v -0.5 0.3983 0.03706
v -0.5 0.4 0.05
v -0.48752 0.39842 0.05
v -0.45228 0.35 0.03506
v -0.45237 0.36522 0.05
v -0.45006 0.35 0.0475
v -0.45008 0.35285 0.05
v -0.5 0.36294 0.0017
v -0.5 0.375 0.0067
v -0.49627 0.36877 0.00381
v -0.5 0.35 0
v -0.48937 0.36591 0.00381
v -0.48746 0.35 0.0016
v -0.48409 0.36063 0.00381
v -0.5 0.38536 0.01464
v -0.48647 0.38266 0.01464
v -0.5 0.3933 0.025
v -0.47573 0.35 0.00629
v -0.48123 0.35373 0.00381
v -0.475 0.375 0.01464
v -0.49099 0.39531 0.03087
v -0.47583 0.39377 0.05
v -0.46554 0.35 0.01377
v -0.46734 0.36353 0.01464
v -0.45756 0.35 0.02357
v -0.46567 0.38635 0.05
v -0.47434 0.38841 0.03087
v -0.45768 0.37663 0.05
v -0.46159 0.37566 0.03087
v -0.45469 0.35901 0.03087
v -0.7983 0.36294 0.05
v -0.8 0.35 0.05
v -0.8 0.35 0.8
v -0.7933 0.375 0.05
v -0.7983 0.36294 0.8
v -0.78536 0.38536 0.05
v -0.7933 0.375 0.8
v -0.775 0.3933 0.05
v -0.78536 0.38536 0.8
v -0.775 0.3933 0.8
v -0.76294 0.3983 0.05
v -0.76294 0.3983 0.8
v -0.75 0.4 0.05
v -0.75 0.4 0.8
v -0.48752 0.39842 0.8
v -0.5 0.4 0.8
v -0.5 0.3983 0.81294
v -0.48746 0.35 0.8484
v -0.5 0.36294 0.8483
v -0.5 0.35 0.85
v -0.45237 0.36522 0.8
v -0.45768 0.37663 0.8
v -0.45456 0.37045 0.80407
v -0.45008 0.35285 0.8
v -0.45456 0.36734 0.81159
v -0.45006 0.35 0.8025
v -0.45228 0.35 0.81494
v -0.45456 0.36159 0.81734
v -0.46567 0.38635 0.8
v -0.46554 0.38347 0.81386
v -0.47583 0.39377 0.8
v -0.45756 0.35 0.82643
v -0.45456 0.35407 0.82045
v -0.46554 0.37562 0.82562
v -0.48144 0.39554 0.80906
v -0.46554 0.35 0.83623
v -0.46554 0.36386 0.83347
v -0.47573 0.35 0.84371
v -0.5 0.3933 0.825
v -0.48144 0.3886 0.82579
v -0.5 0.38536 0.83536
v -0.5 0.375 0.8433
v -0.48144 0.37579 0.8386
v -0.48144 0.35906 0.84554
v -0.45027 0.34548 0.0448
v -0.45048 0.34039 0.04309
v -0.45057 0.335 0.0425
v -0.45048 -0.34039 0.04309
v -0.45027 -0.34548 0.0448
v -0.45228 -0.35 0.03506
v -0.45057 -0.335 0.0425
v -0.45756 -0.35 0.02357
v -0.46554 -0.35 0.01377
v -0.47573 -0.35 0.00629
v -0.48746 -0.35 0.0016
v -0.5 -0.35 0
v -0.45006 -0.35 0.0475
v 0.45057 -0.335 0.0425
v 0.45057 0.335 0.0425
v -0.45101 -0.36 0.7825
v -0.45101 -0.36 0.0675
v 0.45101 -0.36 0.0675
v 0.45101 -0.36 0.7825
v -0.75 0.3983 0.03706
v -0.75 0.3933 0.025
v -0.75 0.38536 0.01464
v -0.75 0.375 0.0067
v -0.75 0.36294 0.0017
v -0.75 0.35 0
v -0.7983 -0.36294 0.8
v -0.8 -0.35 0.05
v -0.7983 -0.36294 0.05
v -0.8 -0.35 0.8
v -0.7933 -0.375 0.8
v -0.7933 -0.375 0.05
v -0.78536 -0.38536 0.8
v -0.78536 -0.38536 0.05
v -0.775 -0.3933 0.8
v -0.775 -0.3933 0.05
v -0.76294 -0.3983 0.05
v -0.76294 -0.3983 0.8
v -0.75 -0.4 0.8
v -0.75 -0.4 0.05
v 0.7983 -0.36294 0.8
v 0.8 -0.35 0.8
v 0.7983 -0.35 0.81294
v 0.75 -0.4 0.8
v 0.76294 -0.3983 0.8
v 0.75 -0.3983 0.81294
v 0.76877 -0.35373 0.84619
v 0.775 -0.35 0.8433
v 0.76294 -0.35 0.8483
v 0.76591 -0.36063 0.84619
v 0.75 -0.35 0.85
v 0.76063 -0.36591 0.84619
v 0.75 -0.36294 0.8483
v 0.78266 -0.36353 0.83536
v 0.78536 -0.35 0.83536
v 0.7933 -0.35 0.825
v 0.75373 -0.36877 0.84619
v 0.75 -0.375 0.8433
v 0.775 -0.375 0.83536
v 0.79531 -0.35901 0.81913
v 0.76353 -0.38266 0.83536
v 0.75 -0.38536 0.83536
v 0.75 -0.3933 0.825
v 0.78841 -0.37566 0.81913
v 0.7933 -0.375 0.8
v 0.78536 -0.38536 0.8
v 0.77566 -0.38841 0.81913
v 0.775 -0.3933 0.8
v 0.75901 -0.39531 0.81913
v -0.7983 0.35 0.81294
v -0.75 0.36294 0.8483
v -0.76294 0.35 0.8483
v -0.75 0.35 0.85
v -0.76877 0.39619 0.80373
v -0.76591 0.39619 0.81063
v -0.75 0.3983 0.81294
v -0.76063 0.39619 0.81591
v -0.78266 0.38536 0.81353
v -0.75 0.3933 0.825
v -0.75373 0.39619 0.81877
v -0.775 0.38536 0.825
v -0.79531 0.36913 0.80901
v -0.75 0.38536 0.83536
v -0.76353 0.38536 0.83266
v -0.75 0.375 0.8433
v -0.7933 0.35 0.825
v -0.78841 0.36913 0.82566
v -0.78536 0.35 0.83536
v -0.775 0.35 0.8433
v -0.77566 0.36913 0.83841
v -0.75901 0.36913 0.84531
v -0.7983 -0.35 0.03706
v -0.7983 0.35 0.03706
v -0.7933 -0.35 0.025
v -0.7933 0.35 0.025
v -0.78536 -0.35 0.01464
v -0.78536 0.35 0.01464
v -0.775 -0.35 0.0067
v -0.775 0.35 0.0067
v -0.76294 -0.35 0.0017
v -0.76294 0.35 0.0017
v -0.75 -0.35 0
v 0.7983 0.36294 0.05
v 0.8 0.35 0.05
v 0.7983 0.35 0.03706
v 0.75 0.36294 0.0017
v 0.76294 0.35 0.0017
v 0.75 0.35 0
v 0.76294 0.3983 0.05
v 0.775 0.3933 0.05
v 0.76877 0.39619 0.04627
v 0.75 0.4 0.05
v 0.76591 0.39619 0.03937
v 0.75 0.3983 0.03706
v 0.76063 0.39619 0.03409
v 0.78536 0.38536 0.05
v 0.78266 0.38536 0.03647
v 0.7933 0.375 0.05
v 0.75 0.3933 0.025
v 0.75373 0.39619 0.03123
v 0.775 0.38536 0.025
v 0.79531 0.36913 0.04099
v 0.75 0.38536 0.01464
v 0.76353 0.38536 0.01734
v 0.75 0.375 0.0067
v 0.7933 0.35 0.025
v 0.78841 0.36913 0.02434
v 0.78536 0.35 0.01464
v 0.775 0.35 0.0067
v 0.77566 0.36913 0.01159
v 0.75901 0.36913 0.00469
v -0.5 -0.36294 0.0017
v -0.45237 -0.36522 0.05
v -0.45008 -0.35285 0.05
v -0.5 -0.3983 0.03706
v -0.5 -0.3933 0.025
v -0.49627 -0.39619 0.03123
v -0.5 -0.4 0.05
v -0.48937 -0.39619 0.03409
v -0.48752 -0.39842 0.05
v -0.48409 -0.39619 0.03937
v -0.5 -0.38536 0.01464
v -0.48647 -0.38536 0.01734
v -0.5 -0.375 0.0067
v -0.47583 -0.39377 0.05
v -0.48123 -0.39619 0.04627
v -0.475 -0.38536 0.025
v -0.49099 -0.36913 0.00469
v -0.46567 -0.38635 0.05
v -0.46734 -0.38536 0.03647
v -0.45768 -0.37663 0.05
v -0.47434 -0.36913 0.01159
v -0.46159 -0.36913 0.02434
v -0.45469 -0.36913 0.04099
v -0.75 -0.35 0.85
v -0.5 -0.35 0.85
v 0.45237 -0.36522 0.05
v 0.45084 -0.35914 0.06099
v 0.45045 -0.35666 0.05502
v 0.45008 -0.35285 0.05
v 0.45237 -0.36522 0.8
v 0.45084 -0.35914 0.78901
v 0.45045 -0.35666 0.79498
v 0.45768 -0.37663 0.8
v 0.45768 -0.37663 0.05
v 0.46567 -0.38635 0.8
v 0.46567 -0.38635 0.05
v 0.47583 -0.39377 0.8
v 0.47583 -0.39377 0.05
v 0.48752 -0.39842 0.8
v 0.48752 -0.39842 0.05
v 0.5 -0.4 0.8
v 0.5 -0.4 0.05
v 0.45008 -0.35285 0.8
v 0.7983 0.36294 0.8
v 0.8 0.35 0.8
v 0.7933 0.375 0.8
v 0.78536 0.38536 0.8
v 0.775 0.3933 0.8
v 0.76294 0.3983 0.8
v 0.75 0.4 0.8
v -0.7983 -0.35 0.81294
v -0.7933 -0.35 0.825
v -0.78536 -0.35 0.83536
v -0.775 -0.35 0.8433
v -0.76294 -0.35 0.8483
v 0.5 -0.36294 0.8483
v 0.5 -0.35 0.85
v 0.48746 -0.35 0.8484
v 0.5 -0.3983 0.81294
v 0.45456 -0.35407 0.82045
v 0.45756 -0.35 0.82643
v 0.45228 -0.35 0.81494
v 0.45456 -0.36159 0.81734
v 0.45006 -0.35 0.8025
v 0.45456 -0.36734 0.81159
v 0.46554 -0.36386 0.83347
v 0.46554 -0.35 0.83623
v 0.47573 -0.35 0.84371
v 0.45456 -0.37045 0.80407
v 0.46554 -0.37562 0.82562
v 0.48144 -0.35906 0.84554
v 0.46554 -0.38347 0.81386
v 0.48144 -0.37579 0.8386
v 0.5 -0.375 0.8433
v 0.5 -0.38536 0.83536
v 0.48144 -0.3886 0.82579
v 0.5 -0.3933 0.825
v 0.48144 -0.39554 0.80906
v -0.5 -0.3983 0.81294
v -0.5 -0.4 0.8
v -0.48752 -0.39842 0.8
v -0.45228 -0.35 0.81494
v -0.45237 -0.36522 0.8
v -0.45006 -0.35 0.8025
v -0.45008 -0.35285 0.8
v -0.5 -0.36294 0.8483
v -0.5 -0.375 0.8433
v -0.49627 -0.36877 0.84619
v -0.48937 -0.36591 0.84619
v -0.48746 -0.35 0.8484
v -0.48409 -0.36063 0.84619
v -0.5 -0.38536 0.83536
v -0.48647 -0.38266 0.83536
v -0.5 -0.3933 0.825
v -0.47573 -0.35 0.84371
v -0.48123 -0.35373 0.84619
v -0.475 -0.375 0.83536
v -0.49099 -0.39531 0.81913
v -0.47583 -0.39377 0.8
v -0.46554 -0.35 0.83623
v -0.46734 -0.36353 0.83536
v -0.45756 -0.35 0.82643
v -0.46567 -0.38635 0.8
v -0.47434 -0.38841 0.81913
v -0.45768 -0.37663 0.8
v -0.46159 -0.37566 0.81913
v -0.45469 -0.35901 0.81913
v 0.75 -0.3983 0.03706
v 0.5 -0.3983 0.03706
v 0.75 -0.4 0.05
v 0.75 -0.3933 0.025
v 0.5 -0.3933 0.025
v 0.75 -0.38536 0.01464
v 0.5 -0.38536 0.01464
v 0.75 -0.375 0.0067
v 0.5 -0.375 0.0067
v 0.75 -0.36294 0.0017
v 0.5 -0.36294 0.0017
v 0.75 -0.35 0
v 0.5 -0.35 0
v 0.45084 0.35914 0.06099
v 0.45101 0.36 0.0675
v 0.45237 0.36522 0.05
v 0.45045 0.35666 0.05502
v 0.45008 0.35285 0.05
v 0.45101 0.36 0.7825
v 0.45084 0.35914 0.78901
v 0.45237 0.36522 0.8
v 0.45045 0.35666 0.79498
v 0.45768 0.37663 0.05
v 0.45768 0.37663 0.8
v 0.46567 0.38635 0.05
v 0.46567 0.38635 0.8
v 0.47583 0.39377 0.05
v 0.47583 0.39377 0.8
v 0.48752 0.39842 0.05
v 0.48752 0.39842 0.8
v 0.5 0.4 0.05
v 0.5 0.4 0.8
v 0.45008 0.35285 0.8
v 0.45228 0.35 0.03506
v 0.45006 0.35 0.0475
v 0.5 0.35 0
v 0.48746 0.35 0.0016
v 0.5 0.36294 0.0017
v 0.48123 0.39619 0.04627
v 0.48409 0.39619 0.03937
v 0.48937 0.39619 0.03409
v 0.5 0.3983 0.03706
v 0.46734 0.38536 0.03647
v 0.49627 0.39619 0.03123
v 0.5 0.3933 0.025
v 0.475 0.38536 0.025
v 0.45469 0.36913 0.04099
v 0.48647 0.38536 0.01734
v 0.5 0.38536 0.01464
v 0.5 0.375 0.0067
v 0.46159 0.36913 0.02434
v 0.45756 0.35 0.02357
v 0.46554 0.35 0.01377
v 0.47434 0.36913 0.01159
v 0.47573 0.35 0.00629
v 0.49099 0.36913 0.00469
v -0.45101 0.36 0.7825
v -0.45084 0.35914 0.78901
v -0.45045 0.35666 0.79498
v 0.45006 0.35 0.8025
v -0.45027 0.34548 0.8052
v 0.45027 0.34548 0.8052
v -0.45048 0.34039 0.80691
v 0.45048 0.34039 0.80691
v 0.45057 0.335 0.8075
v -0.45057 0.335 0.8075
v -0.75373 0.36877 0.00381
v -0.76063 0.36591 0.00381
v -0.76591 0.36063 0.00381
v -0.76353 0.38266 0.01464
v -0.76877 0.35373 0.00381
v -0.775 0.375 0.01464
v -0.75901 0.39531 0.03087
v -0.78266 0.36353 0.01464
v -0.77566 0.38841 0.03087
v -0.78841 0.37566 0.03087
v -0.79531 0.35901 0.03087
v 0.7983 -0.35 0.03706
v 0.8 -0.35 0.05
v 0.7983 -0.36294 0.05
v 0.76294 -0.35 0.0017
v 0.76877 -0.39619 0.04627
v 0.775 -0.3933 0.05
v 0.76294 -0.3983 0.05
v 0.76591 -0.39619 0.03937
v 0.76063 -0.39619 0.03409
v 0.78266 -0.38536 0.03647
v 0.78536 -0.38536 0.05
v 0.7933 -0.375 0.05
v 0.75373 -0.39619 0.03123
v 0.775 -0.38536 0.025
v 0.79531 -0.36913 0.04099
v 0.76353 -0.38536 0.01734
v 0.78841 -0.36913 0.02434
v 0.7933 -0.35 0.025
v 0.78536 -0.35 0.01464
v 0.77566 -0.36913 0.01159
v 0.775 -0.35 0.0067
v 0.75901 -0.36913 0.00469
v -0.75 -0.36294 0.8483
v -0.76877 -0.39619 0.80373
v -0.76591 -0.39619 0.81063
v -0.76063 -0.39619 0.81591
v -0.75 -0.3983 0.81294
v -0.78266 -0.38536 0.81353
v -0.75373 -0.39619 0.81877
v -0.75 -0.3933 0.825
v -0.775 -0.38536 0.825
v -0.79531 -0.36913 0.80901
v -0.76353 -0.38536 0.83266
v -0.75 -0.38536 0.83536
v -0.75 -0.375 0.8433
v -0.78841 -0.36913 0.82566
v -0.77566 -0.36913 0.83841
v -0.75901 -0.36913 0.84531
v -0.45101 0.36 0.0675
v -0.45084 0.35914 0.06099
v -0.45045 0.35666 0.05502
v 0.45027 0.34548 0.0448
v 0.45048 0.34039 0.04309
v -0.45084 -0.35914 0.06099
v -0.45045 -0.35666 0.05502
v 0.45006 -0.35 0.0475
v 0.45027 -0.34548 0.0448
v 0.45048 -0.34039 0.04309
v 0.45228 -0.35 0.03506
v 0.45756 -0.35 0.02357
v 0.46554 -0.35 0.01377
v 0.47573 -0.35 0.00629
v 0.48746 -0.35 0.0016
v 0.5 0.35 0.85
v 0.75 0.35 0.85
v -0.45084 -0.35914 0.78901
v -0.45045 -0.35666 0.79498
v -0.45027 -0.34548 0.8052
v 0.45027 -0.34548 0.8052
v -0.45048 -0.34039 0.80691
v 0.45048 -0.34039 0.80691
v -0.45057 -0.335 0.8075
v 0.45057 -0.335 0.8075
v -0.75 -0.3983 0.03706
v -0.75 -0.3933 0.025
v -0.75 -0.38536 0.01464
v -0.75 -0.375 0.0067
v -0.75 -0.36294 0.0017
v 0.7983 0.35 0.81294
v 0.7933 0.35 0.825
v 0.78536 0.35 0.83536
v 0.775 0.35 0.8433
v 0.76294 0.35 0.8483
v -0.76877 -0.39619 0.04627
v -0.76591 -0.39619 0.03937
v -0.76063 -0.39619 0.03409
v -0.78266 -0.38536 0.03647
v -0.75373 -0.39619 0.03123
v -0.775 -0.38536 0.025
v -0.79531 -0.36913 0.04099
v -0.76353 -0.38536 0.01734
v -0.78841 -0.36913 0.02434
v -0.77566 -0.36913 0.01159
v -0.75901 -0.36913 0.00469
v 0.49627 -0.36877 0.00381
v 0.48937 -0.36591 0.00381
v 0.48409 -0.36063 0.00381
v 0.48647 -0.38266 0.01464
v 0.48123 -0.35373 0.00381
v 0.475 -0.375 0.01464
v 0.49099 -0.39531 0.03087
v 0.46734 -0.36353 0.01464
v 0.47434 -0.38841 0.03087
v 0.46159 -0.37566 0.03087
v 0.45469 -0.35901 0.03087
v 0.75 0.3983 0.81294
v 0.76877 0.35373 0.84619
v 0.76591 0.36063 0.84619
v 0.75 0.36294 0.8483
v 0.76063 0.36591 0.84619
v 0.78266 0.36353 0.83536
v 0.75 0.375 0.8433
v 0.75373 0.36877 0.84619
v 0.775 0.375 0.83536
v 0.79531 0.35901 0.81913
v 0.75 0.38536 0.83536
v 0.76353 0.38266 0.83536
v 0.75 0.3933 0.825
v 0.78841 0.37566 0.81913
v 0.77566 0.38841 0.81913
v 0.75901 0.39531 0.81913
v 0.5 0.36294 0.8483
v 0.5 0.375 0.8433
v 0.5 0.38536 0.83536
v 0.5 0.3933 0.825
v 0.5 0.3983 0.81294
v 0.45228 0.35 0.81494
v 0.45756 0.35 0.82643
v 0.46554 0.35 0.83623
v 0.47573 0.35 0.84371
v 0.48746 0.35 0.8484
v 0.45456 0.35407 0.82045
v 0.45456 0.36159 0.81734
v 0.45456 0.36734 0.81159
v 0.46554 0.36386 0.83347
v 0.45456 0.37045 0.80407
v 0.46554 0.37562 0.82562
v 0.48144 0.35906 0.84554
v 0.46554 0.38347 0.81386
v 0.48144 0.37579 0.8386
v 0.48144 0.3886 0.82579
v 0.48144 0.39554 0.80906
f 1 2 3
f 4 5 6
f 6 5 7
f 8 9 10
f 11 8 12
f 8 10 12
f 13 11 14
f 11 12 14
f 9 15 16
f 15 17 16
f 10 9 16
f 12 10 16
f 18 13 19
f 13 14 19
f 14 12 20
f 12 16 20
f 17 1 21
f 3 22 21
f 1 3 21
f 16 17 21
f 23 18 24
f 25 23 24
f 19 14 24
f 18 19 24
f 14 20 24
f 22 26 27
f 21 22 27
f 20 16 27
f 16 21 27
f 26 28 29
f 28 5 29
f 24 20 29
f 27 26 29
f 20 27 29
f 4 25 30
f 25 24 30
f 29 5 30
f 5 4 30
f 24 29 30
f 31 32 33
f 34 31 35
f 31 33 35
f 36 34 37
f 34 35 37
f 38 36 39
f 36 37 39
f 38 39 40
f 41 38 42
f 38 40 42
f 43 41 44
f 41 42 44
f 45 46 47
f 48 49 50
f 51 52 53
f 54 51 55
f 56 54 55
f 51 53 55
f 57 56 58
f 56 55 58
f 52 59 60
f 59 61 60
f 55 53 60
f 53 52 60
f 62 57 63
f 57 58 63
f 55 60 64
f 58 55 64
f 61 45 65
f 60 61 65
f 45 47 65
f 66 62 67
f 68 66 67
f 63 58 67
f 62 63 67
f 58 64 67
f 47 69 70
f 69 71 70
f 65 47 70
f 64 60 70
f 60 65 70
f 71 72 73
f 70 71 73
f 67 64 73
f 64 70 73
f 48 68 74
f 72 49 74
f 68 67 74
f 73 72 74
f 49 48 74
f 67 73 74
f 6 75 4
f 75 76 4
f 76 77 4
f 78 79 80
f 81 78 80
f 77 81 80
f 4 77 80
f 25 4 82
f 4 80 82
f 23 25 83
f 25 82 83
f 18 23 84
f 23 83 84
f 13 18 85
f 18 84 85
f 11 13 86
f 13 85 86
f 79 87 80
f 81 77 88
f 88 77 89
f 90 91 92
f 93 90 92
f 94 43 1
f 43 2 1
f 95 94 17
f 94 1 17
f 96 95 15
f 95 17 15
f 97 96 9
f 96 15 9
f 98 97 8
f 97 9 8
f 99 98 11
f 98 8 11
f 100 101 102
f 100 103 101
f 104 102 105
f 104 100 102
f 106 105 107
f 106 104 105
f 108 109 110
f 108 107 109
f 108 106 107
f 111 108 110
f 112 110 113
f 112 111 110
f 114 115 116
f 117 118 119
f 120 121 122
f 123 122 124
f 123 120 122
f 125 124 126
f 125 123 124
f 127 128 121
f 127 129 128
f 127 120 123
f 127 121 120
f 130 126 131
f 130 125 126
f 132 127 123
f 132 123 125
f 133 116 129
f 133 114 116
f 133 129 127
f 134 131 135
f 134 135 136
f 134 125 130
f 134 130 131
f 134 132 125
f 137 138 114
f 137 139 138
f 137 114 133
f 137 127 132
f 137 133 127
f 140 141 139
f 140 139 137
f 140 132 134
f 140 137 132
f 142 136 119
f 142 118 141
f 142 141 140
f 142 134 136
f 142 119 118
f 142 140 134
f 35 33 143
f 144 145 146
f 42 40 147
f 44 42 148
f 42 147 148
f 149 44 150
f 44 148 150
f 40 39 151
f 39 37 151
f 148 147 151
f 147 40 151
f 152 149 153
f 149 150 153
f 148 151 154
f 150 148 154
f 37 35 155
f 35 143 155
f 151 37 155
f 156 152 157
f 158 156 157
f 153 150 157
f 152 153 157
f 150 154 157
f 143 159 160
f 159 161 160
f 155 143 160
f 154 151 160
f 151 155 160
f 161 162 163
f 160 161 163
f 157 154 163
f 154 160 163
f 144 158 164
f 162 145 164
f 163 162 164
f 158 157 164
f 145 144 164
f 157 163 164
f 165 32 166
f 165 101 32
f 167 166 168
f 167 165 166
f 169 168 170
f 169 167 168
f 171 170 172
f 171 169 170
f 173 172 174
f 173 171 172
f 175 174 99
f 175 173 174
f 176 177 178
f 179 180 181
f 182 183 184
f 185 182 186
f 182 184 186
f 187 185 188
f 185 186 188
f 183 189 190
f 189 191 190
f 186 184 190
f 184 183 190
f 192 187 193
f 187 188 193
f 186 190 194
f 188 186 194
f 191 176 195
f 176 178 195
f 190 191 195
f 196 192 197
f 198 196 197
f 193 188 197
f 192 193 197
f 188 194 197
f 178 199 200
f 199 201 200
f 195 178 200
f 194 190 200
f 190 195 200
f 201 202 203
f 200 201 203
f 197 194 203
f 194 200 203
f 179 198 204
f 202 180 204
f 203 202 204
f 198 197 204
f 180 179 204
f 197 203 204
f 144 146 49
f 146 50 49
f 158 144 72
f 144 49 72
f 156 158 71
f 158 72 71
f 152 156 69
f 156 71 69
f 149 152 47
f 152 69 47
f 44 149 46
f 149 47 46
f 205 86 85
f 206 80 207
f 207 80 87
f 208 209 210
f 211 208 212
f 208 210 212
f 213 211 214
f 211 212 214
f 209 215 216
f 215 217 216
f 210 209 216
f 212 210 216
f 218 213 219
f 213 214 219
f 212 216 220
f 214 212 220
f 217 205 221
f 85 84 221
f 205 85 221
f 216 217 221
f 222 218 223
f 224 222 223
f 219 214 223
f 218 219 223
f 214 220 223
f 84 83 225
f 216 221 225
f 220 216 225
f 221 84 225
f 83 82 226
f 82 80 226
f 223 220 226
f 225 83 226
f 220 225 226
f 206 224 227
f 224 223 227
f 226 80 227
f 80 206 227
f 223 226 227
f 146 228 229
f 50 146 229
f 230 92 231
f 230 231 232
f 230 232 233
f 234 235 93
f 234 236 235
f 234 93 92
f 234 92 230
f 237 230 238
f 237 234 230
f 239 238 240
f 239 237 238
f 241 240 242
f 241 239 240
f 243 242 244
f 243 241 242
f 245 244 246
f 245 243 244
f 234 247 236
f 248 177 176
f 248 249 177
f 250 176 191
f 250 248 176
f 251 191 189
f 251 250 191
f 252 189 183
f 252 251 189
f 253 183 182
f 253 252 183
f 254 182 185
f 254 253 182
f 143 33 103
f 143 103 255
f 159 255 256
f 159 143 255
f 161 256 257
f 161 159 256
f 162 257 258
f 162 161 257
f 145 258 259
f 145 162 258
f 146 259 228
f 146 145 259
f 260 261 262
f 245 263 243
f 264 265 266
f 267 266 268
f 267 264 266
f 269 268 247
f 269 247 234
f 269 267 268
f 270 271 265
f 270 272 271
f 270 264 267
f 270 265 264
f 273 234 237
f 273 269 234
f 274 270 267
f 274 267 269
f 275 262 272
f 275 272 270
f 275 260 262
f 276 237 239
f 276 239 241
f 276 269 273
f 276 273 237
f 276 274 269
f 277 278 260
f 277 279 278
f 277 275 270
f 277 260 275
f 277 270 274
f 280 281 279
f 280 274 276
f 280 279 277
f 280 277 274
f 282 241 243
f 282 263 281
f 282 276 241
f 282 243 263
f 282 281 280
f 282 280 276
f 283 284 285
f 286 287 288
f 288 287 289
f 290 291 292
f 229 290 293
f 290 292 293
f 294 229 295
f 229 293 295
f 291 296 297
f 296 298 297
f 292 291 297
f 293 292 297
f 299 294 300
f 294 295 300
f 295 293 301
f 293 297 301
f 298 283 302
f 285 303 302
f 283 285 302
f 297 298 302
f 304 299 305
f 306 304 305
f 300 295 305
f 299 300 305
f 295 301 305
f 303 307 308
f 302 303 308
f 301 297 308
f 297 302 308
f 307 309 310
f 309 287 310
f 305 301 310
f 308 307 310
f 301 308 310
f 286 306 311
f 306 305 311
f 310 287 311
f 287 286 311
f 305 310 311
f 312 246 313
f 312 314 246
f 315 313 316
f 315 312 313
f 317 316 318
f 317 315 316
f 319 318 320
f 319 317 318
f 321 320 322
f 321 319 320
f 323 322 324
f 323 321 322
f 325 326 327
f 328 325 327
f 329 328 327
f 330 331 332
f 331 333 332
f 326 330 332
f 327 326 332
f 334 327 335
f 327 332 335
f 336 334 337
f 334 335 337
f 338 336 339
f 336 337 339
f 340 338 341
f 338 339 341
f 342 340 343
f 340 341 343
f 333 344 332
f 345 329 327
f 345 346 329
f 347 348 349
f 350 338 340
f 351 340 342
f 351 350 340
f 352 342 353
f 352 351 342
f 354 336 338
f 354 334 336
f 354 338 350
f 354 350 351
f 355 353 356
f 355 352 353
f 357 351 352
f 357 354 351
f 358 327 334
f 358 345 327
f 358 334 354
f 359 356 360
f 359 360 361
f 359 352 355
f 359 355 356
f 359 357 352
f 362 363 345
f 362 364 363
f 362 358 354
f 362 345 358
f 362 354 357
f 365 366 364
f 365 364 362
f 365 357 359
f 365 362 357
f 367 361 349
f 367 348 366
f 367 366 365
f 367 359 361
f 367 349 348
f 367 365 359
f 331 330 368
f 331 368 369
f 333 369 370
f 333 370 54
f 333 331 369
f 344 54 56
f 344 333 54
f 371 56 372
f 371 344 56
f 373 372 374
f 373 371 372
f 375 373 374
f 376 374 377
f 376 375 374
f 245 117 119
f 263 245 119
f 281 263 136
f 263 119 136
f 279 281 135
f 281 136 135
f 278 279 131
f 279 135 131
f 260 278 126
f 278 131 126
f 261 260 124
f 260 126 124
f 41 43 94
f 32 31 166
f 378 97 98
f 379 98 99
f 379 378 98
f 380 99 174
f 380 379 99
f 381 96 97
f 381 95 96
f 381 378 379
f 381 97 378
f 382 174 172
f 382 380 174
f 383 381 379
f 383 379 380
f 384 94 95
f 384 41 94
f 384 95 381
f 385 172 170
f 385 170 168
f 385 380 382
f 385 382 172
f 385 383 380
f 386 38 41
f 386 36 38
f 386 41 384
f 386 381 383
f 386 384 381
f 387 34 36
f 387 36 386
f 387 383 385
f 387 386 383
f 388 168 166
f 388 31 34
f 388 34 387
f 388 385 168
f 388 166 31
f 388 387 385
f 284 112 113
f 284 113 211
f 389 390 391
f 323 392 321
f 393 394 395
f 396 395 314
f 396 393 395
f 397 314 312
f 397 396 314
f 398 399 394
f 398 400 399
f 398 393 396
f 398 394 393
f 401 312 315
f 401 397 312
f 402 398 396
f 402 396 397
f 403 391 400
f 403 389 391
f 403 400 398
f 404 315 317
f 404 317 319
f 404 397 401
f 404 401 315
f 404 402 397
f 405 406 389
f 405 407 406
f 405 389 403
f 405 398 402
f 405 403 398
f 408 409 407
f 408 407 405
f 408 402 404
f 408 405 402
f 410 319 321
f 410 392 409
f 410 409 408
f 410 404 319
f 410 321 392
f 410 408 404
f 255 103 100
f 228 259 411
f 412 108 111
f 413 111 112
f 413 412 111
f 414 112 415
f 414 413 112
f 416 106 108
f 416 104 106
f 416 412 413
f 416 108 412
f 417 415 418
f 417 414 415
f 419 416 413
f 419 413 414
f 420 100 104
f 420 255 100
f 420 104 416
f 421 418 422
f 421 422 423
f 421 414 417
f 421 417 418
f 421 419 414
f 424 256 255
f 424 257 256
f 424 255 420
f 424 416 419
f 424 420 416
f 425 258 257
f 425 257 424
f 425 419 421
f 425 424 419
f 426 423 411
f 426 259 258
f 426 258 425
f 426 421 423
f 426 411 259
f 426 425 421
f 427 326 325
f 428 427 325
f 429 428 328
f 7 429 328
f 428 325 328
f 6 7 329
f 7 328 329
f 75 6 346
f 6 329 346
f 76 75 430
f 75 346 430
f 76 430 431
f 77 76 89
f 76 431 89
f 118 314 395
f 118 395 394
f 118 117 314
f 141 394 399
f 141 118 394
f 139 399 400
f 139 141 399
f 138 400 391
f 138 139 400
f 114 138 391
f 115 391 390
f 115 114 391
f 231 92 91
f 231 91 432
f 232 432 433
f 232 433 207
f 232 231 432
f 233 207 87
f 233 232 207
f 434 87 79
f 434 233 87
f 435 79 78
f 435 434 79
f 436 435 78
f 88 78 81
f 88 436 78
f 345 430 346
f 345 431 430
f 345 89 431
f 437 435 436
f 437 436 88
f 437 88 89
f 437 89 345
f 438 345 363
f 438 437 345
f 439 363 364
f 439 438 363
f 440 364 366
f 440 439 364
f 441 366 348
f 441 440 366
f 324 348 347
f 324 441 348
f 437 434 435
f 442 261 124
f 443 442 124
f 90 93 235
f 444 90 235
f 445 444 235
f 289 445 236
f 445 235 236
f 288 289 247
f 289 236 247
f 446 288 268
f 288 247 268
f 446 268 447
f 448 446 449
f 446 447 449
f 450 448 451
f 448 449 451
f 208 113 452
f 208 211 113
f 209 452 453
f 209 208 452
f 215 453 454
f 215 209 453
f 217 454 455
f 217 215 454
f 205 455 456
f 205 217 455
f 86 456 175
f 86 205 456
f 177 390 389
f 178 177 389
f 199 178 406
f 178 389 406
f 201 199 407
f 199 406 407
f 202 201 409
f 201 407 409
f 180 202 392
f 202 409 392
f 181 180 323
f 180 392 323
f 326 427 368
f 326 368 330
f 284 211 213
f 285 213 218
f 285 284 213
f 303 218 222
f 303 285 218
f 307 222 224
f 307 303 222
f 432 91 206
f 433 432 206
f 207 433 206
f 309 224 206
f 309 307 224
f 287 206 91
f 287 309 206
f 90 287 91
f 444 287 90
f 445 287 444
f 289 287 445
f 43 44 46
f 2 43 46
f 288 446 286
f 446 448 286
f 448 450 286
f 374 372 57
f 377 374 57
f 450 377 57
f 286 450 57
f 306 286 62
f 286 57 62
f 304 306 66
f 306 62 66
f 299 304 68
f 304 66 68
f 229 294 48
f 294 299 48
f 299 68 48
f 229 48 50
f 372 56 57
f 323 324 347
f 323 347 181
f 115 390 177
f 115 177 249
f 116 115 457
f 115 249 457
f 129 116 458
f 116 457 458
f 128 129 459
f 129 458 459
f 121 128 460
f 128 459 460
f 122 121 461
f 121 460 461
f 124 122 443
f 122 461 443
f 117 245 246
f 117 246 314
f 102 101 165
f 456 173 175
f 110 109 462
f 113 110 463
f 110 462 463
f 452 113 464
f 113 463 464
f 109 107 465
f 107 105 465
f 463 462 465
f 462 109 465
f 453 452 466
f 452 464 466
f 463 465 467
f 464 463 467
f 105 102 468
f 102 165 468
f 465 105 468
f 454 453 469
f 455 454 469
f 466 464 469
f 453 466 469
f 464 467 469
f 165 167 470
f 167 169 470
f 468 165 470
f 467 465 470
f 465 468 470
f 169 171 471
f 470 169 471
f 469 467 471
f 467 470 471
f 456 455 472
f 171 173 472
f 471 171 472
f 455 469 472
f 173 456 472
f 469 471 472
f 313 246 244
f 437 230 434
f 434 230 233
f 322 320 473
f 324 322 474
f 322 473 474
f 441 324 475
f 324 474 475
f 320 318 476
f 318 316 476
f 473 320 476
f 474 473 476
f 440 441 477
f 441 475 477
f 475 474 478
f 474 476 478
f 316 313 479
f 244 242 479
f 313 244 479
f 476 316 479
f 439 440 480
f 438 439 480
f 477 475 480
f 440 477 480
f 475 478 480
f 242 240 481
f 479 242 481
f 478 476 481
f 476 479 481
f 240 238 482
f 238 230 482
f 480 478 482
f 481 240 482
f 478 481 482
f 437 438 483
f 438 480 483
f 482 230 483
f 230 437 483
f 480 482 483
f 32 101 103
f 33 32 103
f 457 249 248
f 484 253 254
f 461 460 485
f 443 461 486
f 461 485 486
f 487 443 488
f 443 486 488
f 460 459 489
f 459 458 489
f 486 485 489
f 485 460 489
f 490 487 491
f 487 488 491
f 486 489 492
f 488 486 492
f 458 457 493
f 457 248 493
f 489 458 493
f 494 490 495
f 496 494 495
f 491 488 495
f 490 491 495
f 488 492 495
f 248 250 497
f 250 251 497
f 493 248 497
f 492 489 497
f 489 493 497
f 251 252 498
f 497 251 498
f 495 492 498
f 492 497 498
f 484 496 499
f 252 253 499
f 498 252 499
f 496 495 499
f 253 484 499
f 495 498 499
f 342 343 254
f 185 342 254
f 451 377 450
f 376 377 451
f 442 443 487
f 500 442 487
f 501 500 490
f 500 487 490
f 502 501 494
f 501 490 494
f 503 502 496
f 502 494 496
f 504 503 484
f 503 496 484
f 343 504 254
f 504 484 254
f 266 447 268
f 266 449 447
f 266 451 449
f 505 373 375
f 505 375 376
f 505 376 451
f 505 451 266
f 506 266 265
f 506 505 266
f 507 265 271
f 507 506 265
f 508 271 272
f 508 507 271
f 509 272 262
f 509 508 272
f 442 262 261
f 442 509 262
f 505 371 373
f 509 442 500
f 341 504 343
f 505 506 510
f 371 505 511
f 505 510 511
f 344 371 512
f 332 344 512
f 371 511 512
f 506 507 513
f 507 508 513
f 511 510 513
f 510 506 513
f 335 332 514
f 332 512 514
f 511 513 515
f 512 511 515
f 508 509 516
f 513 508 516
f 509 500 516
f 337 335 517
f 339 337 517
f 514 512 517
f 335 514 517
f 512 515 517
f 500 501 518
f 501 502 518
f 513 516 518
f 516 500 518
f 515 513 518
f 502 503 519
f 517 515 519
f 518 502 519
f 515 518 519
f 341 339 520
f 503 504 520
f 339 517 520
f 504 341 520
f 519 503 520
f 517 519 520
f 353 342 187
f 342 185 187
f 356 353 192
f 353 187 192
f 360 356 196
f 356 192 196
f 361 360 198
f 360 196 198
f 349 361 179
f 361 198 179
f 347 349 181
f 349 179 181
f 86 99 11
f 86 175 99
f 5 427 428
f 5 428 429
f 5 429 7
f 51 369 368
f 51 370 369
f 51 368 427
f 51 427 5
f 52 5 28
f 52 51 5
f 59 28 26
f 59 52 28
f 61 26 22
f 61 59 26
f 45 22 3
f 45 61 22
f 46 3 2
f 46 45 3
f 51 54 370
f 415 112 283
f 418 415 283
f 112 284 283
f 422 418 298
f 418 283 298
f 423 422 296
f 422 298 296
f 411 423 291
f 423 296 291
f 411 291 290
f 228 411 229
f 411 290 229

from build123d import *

# Parameters (mm, degrees)
SKETCH001_W  = 0.35
SKETCH001_H  = 0.85
PAD001_DEPTH = 0.4
FILLET_R     = 0.05
SKETCH_W     = 1.44
SKETCH_H     = 0.72
PAD_DEPTH    = 0.765
FILLET002_R  = 0.025
SKETCH002_W  = 0.35
SKETCH002_H  = 0.85
PAD002_DEPTH = 0.4
FILLET001_R  = 0.05


with BuildPart() as body001:
    # Sketch001 → Pad001 (new body, symmetric)
    with BuildSketch(Plane.XZ):
        with Locations((-0.625, 0.425)):
            Rectangle(SKETCH001_W, SKETCH001_H)
    extrude(amount=PAD001_DEPTH, both=True)

    # Fillet
    fillet_edges = [body001.edges().sort_by_distance(p)[0] for p in [
        (-0.8, 0, 0.85),
        (-0.8, 0.4, 0.425),
        (-0.625, 0.4, 0.85),
        (-0.45, 0.4, 0.425),
        (-0.625, 0.4, 0),
        (-0.45, 0, 0),
        (-0.8, 0, 0),
        (-0.8, -0.4, 0.425),
        (-0.625, -0.4, 0),
        (-0.45, -0.4, 0.425),
        (-0.625, -0.4, 0.85),
        (-0.45, 0, 0.85),
    ]]
    fillet(fillet_edges, radius=FILLET_R)


with BuildPart() as body:
    # Sketch → Pad (new body)
    with BuildSketch(Plane.XY.offset(0.0425)):
        Rectangle(SKETCH_W, SKETCH_H)
    extrude(amount=PAD_DEPTH)

    # Fillet002
    fillet002_edges = [body.edges().sort_by_distance(p)[0] for p in [
        (0, -0.36, 0.8075),
        (0, 0.36, 0.8075),
        (0, -0.36, 0.0425),
        (0, 0.36, 0.0425),
    ]]
    fillet(fillet002_edges, radius=FILLET002_R)


with BuildPart() as fusion:
    # Sketch002 → Pad002 (new body, symmetric)
    with BuildSketch(Plane.XZ):
        with Locations((0.625, 0.425)):
            Rectangle(SKETCH002_W, SKETCH002_H)
    extrude(amount=PAD002_DEPTH, both=True)

    # Fillet001
    fillet001_edges = [fusion.edges().sort_by_distance(p)[0] for p in [
        (0.8, 0, 0),
        (0.8, 0.4, 0.425),
        (0.8, -0.4, 0.425),
        (0.8, 0, 0.85),
        (0.625, -0.4, 0.85),
        (0.625, 0.4, 0.85),
        (0.45, 0, 0.85),
        (0.45, -0.4, 0.425),
        (0.625, -0.4, 0),
        (0.45, 0, 0),
        (0.45, 0.4, 0.425),
        (0.625, 0.4, 0),
    ]]
    fillet(fillet001_edges, radius=FILLET001_R)

    # Fusion: union Body001, Body
    add(body001.part)
    add(body.part)


solid = fusion.part
